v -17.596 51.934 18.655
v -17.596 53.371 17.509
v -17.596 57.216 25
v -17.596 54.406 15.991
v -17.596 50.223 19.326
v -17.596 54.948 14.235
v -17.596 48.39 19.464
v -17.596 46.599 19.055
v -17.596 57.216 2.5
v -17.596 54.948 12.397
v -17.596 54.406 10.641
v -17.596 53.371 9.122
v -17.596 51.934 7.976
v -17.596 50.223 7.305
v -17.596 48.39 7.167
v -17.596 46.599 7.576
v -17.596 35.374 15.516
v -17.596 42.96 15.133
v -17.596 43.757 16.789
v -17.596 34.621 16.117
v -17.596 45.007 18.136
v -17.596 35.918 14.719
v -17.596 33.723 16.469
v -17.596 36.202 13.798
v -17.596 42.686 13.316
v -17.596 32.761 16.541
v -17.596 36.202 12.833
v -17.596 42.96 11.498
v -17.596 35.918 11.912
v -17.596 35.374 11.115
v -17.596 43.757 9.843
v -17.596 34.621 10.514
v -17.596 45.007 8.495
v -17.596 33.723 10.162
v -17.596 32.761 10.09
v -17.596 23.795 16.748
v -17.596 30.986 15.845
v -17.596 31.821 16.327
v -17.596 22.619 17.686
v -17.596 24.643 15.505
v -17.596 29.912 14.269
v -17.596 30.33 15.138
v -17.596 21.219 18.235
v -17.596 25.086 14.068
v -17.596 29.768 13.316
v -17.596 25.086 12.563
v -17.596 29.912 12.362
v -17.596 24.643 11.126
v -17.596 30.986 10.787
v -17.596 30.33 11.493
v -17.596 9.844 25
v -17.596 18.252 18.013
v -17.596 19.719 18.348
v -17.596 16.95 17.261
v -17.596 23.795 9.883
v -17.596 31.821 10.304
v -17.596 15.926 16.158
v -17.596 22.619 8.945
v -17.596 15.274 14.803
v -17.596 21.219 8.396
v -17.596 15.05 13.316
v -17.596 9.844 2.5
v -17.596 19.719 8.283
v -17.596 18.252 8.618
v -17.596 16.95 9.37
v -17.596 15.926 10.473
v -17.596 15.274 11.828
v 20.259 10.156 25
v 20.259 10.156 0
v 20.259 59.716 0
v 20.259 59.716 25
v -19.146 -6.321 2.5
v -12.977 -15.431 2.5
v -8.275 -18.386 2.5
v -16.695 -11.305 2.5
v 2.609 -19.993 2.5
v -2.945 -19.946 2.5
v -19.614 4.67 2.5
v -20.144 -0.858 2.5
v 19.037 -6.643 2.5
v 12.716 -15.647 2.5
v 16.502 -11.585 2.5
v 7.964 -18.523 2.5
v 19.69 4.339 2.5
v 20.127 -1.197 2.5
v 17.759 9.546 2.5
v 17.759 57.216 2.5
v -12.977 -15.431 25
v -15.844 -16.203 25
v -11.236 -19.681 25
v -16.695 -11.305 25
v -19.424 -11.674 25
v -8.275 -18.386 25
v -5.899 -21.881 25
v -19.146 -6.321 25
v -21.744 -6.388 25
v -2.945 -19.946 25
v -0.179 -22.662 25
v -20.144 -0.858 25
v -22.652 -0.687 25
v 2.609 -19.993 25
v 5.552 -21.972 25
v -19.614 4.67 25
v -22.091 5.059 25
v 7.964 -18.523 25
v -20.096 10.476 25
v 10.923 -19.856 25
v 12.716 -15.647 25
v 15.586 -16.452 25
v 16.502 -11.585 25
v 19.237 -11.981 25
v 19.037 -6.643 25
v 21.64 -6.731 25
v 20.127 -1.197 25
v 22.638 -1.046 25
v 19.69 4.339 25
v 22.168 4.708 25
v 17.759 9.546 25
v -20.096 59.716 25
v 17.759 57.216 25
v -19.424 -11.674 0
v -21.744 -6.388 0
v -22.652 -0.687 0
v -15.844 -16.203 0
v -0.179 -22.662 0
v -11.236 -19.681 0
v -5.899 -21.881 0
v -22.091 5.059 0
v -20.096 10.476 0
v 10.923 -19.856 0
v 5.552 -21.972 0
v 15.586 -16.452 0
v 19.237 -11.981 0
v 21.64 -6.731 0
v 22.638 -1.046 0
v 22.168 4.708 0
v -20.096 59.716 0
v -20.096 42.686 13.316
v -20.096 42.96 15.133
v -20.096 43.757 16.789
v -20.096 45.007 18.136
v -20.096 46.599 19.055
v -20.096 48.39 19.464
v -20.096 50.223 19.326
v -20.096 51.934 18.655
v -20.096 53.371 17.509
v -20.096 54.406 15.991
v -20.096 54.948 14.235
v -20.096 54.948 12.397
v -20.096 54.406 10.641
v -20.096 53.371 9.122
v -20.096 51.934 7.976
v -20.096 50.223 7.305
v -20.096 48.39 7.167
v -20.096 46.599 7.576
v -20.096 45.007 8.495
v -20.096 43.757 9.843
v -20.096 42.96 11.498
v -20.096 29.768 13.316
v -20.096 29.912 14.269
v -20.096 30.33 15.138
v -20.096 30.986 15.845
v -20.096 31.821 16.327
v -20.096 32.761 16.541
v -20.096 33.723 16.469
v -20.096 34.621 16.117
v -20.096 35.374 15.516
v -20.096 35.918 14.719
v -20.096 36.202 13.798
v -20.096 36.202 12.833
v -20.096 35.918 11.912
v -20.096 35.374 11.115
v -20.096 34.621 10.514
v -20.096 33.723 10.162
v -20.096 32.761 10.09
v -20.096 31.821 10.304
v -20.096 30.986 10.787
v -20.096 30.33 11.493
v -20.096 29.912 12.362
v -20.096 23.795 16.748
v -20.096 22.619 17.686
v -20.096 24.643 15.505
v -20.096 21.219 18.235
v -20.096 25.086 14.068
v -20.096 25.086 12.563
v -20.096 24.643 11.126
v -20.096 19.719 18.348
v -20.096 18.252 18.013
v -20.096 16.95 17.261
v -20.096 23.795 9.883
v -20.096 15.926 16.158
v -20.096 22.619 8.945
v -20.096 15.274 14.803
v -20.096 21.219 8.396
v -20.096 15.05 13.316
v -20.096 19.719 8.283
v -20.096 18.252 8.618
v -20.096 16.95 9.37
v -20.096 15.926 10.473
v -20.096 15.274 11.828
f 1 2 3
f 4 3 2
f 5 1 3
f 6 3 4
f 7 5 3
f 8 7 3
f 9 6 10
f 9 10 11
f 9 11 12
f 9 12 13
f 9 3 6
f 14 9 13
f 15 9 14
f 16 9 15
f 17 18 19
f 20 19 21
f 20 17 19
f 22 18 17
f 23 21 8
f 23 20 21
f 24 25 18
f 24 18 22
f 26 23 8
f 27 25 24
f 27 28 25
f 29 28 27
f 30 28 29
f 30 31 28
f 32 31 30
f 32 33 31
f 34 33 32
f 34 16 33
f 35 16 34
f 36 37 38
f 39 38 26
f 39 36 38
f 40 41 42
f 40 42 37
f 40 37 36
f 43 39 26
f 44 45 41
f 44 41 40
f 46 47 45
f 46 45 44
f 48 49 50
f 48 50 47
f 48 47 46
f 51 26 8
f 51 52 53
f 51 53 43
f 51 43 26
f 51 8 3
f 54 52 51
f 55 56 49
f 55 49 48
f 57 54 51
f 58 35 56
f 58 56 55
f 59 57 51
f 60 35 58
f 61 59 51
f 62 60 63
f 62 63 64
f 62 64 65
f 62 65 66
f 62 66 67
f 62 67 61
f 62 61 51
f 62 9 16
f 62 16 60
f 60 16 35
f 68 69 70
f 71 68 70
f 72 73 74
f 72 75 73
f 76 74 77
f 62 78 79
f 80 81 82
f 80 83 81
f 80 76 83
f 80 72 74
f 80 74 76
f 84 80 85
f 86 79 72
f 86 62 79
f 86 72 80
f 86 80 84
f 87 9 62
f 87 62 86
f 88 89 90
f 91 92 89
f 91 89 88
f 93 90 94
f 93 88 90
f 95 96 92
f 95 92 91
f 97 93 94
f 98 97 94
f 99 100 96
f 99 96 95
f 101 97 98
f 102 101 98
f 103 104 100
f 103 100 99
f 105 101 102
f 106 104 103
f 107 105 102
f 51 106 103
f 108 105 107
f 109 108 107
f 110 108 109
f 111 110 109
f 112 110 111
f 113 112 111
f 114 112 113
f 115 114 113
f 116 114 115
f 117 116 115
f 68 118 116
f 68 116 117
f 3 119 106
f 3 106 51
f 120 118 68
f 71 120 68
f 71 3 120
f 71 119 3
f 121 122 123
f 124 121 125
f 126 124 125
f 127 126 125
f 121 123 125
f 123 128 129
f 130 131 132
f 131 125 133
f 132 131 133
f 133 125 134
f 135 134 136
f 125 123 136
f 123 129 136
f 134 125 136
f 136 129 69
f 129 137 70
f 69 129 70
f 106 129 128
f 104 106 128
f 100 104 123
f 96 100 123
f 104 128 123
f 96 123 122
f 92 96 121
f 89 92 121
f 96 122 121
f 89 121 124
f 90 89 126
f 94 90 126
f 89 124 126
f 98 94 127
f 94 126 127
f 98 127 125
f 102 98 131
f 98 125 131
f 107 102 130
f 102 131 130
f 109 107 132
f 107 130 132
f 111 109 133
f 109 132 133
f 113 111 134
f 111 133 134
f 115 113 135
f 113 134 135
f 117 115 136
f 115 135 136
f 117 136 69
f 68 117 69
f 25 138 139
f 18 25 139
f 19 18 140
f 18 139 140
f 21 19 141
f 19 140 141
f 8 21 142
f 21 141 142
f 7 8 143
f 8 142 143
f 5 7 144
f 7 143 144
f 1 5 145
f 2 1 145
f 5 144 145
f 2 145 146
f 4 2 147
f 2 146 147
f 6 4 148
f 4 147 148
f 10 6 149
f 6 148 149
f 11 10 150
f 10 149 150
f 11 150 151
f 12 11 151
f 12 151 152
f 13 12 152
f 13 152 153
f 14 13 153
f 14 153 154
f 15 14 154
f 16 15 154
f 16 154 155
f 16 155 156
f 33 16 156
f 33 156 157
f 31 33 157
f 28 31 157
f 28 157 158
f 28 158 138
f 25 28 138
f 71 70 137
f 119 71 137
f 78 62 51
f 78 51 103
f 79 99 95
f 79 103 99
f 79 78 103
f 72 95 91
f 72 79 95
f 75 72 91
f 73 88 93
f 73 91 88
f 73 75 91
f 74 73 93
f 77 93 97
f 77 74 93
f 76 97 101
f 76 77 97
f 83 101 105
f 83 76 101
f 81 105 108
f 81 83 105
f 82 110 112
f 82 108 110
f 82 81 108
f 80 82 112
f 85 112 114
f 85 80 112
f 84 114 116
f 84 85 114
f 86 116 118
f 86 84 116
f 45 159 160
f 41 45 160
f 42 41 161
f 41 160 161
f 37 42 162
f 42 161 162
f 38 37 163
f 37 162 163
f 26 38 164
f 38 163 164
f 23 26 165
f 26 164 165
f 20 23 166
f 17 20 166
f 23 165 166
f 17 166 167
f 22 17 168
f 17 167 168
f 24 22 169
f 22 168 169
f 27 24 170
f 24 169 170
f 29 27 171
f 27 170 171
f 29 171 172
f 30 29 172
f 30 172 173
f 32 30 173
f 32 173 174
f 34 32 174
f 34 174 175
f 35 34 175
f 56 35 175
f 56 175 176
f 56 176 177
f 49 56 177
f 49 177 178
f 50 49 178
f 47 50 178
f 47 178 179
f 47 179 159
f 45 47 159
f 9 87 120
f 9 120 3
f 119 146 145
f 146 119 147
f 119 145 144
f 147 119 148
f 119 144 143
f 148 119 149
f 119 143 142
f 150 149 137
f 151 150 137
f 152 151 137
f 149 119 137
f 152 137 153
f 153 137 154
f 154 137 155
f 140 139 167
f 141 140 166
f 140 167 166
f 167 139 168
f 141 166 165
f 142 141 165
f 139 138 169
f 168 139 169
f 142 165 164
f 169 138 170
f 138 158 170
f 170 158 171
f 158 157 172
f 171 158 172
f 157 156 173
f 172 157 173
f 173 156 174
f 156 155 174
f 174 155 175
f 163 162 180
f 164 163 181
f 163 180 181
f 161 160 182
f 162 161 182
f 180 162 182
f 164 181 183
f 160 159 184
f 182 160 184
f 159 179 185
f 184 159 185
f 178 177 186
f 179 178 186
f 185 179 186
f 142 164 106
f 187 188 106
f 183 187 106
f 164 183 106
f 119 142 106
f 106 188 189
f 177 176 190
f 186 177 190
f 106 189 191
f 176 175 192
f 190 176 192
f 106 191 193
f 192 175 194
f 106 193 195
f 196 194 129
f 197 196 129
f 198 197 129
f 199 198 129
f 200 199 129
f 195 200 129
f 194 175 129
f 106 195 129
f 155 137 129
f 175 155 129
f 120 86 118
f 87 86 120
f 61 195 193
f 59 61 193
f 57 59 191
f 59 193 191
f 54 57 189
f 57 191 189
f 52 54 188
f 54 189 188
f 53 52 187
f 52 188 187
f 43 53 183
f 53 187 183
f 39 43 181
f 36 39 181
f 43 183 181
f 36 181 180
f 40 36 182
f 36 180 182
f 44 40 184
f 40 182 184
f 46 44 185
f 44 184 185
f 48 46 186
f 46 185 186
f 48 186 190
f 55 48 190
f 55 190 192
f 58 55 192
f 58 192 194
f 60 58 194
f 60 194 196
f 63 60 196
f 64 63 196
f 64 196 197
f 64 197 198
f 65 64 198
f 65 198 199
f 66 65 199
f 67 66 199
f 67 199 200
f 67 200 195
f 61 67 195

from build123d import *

# Parameters (mm, degrees)
F1_DEPTH = 25
F2_T     = -2.5
F3_R     = 6.1653631348
F3_R_2   = 3.2347943308
F3_R_3   = 5.0463552764
F4_DEPTH = 25


with BuildPart() as f1:
    # F0 (on Top) → F1 (new body)
    with BuildSketch(Plane.XY):
        with BuildLine():
            Line((-20.0959555805, 59.7160309553), (-20.0959555805, 10.4758823072))
            ThreePointArc((-20.0959555805, 10.4758823072), (-0.1794521824, -22.6618476237), (20.2593356371, 10.1563212016))
            Line((20.2593356371, 10.1563212016), (20.2593356371, 59.7160309553))
            Line((20.2593356371, 59.7160309553), (-20.0959555805, 59.7160309553))
        make_face()
    extrude(amount=F1_DEPTH)

    # F2
    f2_openings = [f1.faces().sort_by_distance(p)[0] for p in [
        (0.050089, 19.786253, 25),
    ]]
    offset(amount=F2_T, openings=f2_openings, kind=Kind.INTERSECTION)

    # F3 (on face) → F4 (cut)
    with BuildSketch(Plane(origin=(-20.0959555805, 0, 0), x_dir=(0, -1, 0), z_dir=(-1, 0, 0))):
        with Locations((-48.8511435688, 13.3156133816)):
            Circle(F3_R)
        with Locations((-33.0031141639, 13.3156133816)):
            Circle(F3_R_2)
        with Locations((-20.0959555805, 13.3156133816)):
            Circle(F3_R_3)
    extrude(amount=-F4_DEPTH, mode=Mode.SUBTRACT)


solid = f1.part
